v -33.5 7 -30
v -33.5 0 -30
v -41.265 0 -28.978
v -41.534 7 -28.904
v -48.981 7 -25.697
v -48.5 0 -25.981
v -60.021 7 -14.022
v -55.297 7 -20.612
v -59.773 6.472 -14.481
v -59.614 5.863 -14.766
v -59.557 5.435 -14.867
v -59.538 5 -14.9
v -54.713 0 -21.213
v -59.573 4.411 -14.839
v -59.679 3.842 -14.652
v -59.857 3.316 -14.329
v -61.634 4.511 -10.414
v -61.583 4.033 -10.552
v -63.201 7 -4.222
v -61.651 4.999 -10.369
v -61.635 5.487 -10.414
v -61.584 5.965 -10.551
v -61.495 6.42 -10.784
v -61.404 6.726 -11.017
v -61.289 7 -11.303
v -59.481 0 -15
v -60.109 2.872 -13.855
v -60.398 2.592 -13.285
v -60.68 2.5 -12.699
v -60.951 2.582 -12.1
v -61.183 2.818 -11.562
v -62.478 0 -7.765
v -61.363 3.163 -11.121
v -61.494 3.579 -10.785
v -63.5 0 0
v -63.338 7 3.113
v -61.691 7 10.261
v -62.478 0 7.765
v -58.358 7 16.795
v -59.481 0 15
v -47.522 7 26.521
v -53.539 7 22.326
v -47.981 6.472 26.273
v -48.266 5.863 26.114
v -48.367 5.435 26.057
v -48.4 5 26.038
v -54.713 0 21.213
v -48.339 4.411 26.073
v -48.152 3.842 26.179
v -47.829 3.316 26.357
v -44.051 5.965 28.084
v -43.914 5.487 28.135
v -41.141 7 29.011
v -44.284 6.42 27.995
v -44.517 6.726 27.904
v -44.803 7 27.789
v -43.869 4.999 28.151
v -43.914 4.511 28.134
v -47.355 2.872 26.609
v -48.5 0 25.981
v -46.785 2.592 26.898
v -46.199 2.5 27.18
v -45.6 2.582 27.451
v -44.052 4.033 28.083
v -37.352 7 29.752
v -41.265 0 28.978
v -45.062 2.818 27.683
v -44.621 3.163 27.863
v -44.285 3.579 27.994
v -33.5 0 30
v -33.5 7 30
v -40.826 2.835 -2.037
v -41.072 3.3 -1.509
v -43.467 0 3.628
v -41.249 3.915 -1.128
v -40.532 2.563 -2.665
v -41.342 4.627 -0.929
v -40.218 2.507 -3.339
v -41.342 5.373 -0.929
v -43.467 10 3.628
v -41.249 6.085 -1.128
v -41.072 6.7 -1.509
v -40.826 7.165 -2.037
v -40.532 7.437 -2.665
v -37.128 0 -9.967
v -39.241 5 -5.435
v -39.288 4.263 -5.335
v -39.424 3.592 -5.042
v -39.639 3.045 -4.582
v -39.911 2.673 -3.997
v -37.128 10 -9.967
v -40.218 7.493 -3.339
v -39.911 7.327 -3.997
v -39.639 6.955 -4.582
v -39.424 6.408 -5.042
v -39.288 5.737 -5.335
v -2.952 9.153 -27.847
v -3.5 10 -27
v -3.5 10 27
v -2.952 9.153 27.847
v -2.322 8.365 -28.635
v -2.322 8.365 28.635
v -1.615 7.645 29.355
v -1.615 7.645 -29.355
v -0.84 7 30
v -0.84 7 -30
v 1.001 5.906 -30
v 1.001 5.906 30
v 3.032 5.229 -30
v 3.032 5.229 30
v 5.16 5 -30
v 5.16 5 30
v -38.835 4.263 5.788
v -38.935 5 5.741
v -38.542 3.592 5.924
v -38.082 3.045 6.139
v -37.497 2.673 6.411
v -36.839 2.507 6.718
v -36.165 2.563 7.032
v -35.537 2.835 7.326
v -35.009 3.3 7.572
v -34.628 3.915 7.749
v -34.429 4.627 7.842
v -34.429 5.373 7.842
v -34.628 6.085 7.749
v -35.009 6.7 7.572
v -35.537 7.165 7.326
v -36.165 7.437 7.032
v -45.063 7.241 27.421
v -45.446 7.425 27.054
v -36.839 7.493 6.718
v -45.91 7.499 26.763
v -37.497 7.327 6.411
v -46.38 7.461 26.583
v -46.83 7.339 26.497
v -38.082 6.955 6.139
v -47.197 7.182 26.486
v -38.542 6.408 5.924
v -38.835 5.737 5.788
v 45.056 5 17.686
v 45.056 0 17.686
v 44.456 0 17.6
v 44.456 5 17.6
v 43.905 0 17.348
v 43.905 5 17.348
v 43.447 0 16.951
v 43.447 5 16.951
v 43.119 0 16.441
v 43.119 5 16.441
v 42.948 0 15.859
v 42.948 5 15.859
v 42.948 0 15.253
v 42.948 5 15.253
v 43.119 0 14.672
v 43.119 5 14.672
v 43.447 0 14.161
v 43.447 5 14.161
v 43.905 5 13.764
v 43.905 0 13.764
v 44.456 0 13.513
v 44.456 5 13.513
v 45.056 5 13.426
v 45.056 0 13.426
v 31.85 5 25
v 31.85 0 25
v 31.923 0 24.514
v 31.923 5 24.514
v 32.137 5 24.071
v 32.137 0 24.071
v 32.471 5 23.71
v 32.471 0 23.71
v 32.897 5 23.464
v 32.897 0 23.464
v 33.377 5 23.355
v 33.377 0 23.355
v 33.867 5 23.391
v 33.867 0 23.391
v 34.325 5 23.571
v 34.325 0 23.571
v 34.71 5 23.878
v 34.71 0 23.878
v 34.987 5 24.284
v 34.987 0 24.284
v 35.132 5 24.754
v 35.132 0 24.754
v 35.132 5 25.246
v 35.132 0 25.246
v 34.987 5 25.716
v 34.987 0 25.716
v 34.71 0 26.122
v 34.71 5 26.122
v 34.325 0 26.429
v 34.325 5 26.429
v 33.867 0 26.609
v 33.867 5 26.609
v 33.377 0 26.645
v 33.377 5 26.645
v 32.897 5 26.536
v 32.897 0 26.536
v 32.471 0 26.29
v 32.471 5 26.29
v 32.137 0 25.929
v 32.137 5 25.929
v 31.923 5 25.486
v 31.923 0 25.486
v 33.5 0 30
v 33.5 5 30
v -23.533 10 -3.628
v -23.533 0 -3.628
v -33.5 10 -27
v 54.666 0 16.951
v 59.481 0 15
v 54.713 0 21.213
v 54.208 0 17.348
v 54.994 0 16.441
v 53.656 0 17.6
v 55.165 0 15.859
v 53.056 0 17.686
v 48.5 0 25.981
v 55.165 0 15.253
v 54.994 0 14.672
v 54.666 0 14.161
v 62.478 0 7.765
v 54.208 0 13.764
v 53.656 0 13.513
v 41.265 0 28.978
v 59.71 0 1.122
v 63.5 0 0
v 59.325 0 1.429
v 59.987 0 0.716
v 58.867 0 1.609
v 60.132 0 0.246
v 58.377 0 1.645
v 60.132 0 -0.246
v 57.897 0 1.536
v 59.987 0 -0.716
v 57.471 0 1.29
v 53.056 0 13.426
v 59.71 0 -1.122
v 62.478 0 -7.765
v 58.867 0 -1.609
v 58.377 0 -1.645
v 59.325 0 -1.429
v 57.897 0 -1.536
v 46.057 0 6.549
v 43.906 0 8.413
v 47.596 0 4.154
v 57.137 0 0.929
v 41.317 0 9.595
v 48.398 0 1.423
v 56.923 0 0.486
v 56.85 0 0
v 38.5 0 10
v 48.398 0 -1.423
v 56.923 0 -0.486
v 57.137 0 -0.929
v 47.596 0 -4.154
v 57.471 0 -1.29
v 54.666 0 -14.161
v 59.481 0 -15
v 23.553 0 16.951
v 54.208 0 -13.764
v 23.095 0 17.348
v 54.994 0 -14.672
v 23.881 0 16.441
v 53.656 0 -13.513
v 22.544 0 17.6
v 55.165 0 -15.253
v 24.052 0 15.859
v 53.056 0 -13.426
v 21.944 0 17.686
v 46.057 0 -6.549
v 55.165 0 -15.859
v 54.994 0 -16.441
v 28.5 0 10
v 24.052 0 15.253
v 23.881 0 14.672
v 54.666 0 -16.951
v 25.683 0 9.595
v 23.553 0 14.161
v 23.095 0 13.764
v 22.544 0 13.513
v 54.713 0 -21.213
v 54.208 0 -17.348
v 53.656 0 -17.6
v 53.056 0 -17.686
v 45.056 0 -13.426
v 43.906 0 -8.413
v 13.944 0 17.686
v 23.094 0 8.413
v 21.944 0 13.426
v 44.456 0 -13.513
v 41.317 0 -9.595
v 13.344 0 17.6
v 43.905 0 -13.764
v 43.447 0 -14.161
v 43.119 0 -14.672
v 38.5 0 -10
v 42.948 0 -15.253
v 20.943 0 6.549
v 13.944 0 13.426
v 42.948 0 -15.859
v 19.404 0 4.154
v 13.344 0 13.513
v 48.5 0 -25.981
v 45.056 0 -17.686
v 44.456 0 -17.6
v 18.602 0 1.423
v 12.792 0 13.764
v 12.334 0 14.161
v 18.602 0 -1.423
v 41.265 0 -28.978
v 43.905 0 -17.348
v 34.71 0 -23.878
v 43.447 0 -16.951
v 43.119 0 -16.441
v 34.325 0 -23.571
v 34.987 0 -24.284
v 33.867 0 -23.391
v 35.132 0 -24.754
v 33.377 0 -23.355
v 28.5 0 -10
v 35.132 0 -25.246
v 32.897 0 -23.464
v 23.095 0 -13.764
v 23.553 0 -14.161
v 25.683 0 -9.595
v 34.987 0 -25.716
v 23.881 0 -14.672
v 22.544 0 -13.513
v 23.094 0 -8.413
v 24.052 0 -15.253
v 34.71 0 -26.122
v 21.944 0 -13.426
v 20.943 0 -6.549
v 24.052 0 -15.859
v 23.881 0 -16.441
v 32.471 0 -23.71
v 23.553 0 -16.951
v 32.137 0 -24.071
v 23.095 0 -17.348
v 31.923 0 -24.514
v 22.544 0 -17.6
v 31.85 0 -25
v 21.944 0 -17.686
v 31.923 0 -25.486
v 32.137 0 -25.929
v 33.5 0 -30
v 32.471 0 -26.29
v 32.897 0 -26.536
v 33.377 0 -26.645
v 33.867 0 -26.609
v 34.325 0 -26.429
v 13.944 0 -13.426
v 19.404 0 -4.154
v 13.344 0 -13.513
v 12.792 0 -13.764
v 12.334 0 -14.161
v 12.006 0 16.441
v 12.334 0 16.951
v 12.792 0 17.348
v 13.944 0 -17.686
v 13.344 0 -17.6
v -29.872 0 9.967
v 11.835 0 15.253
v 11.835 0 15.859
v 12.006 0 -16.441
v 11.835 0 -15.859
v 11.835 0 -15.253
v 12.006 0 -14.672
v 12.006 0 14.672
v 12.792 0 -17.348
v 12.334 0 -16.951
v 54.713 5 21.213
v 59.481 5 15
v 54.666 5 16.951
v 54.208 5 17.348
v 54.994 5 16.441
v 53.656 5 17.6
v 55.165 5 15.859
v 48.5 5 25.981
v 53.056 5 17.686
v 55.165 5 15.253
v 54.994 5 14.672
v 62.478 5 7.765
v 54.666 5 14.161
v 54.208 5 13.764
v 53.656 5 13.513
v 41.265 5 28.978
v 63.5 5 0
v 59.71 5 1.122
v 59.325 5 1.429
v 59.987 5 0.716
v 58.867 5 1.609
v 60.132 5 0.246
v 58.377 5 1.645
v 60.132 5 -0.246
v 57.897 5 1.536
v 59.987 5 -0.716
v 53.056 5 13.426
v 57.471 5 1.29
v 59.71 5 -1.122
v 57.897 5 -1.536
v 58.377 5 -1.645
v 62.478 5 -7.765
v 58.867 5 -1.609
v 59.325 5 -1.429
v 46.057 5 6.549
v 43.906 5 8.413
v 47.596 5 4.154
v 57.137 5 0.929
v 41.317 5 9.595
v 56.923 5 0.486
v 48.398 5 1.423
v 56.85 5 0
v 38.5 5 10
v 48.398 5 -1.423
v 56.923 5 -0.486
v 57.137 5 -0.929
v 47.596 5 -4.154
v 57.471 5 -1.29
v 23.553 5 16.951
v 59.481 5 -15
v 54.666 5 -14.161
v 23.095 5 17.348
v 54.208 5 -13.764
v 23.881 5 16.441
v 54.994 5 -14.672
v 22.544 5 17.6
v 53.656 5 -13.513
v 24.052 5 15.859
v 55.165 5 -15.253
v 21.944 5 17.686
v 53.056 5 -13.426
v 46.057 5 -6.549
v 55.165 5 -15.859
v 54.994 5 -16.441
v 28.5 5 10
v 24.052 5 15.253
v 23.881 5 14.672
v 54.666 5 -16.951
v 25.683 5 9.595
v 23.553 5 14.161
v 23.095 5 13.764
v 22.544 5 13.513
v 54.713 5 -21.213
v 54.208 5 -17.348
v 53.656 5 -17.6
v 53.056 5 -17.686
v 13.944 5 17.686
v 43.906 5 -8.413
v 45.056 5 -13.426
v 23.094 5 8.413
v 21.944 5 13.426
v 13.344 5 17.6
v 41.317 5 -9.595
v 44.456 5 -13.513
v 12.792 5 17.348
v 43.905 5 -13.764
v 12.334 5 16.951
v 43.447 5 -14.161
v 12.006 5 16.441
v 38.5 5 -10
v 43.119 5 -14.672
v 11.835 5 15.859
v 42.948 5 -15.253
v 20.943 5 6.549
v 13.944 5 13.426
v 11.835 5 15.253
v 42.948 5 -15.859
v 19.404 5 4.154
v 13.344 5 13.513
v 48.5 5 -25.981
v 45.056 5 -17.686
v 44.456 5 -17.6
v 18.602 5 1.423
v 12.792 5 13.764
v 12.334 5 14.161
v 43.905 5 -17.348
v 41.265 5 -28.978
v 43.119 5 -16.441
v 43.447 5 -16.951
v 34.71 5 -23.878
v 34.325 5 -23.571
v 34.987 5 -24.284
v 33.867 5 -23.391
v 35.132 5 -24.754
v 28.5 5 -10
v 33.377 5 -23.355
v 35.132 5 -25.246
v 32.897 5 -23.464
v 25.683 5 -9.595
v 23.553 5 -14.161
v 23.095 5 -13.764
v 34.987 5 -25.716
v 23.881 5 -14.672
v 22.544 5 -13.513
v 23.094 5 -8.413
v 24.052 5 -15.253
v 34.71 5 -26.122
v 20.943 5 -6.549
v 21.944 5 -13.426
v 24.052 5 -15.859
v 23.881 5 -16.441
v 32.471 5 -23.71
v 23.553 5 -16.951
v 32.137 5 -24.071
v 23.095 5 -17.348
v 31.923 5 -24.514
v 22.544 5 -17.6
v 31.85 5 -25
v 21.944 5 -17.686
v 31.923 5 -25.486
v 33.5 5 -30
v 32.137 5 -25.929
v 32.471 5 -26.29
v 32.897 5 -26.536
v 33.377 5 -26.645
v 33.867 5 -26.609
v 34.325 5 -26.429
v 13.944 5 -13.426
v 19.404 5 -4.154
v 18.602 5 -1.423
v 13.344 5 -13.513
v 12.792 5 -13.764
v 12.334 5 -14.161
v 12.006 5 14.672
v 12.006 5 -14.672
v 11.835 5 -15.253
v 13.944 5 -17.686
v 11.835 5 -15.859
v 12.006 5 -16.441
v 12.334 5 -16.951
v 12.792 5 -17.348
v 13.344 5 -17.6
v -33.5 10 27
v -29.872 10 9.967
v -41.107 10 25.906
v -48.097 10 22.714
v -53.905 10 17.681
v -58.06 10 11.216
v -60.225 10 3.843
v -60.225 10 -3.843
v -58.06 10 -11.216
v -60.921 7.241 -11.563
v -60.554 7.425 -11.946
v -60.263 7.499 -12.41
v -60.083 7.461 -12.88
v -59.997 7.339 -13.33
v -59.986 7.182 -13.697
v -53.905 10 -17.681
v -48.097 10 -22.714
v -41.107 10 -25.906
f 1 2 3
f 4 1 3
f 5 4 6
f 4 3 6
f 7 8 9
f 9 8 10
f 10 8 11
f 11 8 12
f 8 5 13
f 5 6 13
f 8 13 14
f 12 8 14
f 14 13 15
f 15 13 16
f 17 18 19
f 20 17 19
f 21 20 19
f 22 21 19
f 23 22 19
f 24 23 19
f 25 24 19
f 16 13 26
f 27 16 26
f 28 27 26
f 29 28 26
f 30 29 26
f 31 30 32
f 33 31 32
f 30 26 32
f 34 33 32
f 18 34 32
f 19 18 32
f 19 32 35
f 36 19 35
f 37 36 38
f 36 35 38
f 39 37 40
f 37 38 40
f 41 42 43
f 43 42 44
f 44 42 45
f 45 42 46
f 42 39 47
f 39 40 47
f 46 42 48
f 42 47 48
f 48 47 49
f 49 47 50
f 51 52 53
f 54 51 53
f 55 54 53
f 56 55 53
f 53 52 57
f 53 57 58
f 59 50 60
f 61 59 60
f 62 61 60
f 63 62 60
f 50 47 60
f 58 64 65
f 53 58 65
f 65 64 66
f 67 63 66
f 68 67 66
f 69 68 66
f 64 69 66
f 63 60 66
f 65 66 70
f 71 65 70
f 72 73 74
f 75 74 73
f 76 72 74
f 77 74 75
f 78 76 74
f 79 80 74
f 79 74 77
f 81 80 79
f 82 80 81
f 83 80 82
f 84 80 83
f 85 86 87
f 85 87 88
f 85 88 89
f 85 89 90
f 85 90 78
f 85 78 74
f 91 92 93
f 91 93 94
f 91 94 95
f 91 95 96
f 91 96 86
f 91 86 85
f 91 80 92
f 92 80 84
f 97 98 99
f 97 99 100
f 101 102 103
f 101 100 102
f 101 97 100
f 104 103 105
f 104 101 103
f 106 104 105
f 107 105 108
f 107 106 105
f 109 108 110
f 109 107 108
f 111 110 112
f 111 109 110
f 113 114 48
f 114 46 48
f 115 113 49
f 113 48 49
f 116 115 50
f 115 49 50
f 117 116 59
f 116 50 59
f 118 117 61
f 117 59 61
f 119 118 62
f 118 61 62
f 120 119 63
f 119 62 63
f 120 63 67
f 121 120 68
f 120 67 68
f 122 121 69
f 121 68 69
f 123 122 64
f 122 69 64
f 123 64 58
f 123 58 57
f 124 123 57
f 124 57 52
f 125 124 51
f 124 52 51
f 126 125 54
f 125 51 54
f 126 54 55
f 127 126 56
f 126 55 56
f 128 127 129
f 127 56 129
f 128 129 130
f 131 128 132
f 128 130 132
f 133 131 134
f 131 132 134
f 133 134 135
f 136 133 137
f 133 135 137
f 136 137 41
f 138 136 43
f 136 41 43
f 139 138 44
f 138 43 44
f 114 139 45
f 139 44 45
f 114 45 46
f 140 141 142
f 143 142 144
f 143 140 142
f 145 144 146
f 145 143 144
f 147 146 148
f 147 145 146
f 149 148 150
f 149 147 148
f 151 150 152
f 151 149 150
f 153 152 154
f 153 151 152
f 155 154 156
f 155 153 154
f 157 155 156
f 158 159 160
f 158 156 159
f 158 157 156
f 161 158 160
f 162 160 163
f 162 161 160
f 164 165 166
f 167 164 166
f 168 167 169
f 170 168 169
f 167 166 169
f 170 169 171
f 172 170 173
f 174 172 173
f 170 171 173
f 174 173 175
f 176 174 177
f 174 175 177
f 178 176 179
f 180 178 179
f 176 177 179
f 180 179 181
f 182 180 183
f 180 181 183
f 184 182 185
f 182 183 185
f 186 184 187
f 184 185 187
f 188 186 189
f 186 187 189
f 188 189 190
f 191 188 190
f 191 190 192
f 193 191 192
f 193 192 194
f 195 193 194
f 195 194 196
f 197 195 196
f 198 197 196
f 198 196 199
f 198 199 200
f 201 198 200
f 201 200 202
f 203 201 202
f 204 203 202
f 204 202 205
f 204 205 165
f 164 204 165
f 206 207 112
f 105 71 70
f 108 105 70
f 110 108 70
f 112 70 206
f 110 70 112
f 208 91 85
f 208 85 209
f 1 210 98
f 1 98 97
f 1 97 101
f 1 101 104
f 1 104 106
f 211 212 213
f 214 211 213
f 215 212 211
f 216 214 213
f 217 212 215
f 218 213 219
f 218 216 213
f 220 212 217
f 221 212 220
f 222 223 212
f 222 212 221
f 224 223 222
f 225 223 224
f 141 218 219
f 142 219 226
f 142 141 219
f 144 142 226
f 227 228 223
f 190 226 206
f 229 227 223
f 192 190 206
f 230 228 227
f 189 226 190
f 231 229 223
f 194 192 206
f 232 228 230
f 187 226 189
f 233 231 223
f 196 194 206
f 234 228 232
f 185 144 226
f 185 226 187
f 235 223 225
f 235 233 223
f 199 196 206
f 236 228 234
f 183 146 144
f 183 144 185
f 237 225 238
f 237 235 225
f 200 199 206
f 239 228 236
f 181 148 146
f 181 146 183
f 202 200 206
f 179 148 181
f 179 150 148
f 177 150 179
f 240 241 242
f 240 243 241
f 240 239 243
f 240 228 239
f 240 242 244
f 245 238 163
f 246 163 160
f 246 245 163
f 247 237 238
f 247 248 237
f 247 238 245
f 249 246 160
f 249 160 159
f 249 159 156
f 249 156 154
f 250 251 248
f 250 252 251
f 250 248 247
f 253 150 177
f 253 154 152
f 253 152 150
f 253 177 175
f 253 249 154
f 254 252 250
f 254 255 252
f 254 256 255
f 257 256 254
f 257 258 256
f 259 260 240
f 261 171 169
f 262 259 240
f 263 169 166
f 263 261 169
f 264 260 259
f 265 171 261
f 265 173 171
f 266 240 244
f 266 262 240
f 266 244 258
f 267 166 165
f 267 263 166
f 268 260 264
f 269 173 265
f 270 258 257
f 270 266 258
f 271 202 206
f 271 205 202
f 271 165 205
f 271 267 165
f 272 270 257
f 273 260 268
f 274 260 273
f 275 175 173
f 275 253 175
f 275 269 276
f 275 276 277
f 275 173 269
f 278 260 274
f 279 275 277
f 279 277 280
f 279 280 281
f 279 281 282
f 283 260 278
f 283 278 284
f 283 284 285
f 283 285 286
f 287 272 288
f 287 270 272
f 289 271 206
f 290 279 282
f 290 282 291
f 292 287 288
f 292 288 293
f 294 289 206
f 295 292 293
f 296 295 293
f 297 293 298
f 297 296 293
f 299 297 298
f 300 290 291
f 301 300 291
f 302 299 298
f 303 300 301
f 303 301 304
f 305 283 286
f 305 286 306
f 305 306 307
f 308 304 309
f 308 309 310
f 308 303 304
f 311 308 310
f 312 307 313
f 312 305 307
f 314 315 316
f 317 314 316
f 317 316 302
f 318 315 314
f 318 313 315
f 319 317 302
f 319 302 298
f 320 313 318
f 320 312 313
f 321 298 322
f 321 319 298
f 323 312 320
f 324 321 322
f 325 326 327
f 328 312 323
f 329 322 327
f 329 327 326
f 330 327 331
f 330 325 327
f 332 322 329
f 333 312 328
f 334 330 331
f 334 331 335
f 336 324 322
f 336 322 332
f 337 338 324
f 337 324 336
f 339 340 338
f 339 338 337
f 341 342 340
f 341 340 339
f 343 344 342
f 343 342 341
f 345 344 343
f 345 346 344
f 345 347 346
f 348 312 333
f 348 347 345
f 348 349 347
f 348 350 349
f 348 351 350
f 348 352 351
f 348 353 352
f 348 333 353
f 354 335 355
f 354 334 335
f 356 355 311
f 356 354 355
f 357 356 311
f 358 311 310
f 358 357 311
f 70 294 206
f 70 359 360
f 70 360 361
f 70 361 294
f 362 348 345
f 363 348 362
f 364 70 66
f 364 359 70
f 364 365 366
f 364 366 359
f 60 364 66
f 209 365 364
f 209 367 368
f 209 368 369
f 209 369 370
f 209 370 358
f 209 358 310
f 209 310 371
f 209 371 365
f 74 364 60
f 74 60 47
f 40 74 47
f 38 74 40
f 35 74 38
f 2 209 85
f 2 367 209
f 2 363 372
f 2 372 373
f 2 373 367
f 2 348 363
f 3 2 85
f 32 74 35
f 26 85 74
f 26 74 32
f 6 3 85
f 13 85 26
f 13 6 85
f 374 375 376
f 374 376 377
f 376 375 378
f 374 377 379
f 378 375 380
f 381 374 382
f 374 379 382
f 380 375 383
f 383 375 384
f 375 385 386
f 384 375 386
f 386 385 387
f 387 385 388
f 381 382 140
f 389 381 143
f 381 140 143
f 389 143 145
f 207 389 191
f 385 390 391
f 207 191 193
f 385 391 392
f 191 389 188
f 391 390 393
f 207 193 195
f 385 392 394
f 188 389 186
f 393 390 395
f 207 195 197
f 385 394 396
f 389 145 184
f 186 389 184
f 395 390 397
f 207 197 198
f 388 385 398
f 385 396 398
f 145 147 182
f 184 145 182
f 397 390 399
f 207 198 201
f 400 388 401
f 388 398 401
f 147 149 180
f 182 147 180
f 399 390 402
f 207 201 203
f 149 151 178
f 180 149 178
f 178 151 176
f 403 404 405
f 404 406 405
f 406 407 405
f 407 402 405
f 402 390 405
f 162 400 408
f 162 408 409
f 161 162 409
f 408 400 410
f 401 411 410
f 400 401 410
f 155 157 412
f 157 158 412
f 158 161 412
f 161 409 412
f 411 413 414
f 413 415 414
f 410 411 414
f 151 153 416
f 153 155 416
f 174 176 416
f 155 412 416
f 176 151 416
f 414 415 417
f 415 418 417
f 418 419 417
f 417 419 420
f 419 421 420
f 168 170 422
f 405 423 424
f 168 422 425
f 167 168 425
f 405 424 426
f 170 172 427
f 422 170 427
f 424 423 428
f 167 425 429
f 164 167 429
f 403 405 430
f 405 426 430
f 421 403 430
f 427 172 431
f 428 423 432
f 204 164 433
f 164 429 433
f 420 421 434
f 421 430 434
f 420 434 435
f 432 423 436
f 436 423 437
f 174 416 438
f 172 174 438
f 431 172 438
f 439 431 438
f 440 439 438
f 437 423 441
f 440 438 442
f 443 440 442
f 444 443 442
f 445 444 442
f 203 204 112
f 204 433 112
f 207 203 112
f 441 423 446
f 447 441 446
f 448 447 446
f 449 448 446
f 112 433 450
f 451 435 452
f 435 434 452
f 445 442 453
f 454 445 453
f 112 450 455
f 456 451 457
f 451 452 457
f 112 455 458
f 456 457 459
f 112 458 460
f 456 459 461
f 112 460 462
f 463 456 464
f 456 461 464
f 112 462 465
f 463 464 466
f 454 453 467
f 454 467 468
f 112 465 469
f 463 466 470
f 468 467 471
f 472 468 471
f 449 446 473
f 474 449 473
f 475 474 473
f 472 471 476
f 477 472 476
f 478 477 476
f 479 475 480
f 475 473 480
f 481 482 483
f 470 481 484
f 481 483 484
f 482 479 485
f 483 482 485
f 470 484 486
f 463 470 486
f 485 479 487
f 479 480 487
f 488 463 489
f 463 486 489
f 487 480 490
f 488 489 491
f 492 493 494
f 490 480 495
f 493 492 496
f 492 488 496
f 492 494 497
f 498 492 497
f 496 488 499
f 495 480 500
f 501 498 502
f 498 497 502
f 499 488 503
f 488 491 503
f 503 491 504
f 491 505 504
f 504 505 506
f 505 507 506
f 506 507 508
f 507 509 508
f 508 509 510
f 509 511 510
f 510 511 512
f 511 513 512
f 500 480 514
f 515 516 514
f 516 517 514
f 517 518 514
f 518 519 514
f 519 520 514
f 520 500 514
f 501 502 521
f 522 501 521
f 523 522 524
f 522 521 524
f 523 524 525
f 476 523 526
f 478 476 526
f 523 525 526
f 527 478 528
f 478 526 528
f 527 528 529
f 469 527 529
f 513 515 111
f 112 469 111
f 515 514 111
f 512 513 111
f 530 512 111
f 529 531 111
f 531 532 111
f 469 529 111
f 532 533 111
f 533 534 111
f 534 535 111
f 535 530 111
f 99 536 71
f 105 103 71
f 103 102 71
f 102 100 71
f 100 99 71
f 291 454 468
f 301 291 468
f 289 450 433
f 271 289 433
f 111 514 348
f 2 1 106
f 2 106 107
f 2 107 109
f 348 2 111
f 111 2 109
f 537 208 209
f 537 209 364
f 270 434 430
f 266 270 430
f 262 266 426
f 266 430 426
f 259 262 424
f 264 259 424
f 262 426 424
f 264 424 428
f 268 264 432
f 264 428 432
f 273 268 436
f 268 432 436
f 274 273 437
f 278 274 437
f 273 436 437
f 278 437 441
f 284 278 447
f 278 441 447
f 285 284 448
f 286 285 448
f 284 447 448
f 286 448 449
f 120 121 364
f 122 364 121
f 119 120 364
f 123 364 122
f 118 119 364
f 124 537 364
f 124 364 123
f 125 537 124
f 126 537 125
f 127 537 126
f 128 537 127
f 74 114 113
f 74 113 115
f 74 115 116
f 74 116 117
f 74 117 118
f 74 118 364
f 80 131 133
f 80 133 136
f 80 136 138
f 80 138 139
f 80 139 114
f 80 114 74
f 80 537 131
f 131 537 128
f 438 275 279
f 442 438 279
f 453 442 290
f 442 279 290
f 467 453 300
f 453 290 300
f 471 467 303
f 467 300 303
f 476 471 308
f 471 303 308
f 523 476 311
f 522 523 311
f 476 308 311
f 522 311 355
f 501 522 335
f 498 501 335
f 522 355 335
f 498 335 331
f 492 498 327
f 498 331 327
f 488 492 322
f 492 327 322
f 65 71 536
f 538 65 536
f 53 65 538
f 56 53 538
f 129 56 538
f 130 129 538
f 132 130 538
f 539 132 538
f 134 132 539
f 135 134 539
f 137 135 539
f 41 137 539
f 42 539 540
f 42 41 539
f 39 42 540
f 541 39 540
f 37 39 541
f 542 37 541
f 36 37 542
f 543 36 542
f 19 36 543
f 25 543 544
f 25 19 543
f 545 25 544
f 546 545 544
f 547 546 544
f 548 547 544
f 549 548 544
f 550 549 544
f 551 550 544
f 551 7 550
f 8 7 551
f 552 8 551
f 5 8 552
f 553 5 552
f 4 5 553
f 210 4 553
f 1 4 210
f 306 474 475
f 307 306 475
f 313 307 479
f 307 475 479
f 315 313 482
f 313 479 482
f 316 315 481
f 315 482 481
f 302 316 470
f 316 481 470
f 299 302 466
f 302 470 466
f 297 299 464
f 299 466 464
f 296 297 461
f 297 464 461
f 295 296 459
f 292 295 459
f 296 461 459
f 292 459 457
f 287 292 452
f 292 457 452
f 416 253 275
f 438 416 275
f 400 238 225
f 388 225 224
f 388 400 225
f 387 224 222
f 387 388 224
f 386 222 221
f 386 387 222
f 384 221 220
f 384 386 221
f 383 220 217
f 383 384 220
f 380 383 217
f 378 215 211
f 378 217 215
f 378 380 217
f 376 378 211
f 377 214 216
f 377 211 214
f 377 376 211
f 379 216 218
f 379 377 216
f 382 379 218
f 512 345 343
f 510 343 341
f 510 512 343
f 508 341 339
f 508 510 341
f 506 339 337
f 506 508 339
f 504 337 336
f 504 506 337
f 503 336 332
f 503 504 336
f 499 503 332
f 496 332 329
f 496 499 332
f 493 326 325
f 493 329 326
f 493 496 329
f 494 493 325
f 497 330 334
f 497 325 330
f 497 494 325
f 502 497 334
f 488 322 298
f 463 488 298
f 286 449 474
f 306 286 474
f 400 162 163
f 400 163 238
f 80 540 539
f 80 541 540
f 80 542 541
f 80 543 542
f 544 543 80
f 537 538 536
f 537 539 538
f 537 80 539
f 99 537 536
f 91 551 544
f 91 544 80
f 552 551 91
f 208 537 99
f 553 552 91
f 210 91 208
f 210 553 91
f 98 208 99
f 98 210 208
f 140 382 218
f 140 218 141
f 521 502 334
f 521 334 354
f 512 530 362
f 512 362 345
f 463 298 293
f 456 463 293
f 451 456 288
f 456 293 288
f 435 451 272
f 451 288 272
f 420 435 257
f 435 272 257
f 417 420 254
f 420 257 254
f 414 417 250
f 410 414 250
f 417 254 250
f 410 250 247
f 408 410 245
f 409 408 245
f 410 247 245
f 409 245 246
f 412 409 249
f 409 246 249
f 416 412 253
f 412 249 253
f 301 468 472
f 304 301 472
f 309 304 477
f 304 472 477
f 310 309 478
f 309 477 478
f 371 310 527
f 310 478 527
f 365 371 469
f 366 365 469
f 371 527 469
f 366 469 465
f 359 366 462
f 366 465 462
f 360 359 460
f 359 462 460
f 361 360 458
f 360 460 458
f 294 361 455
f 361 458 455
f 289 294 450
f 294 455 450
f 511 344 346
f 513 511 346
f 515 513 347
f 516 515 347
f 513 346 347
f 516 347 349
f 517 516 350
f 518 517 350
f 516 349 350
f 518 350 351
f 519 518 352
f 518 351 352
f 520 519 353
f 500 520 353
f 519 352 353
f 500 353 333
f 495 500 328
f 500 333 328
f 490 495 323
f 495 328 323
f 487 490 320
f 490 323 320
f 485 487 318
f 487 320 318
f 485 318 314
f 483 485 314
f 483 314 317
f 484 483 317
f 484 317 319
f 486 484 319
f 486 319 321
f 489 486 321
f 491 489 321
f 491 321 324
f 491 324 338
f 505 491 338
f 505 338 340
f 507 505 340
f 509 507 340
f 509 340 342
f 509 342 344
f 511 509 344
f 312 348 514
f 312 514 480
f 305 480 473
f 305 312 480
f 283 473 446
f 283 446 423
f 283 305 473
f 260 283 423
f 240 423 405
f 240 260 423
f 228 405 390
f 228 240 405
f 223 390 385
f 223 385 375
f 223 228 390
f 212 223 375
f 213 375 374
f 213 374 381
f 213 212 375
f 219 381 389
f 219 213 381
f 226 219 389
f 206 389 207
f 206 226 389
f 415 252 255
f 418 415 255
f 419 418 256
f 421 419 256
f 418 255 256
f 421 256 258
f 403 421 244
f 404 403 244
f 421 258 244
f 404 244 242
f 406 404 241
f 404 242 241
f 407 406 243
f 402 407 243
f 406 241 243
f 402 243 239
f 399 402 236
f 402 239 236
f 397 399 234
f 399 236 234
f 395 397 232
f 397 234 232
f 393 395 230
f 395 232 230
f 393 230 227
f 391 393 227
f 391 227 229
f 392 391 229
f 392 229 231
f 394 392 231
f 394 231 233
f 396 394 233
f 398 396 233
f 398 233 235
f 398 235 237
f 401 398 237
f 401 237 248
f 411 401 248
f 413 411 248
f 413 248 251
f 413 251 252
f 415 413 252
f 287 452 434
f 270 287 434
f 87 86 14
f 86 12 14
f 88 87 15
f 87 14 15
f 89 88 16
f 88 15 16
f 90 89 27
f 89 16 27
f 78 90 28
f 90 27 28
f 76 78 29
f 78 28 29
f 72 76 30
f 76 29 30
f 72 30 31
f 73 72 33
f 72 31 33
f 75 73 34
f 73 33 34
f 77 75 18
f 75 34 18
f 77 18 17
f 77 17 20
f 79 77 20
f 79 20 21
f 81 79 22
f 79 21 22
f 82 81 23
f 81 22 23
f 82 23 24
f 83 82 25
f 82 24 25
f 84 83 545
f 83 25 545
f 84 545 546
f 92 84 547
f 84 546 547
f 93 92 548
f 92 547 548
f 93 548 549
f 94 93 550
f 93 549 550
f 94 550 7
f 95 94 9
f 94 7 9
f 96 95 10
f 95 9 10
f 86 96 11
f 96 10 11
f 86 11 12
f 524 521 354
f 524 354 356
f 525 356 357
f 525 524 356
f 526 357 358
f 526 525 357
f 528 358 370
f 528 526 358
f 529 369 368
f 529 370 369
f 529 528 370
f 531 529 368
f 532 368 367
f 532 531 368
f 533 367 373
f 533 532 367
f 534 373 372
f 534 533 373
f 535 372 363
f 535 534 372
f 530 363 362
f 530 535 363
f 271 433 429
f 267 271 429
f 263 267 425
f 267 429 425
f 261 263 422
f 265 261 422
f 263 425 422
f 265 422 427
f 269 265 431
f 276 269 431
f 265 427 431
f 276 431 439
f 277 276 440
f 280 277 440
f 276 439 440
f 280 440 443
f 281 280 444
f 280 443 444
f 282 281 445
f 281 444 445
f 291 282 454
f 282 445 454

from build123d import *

# Parameters (mm, degrees)
BOSS_EXTRUDE1_DEPTH = 5
CUT_EXTRUDE1_DEPTH  = 71.407741052
BOSS_EXTRUDE2_DEPTH = 5
FILLET1_R           = 10
CUT_EXTRUDE2_DEPTH  = 71.938353519
M4_TAPPED_HOLE1_D   = 3.3
SKETCH13_W          = 2.5
SKETCH13_H          = 32.367781463
SKETCH14_W          = 2.5
SKETCH14_H          = 32.367781463
CHAMFER1_SIZE       = 3


with BuildPart() as part:
    # Sketch1 → Boss-Extrude1 (new body)
    with BuildSketch(Plane(origin=(0, 0, 0), x_dir=(1, 0, 0), z_dir=(0, 1, 0))):
        with BuildLine():
            Line((-33.5, 30), (33.5, 30))
            ThreePointArc((33.5, 30), (63.5, 0), (33.5, -30))
            Line((33.5, -30), (-33.5, -30))
            ThreePointArc((-33.5, -30), (-63.5, 0), (-33.5, 30))
        make_face()
        with BuildLine():
            Line((28.5, 10), (38.5, 10))
            ThreePointArc((38.5, 10), (48.5, 0), (38.5, -10))
            Line((38.5, -10), (28.5, -10))
            ThreePointArc((28.5, -10), (18.5, 0), (28.5, 10))
        make_face(mode=Mode.SUBTRACT)
    extrude(amount=BOSS_EXTRUDE1_DEPTH)

    # Sketch2 → Cut-Extrude1 (cut, through all)
    with BuildSketch(Plane(origin=(0, 5, 0), x_dir=(1, 0, 0), z_dir=(0, 1, 0))):
        with BuildLine():
            Line((13.943650814, 17.686349186), (21.943650814, 17.686349186))
            ThreePointArc((21.943650814, 17.686349186), (24.073650814, 15.556349186), (21.943650814, 13.426349186))
            Line((21.943650814, 13.426349186), (13.943650814, 13.426349186))
            ThreePointArc((13.943650814, 13.426349186), (11.813650814, 15.556349186), (13.943650814, 17.686349186))
        make_face()
        with BuildLine():
            Line((53.056349186, 17.686349186), (45.056349186, 17.686349186))
            ThreePointArc((45.056349186, 17.686349186), (42.926349186, 15.556349186), (45.056349186, 13.426349186))
            Line((45.056349186, 13.426349186), (53.056349186, 13.426349186))
            ThreePointArc((53.056349186, 13.426349186), (55.186349186, 15.556349186), (53.056349186, 17.686349186))
        make_face()
        with BuildLine():
            Line((53.056349186, -17.686349186), (45.056349186, -17.686349186))
            ThreePointArc((45.056349186, -17.686349186), (42.926349186, -15.556349186), (45.056349186, -13.426349186))
            Line((45.056349186, -13.426349186), (53.056349186, -13.426349186))
            ThreePointArc((53.056349186, -13.426349186), (55.186349186, -15.556349186), (53.056349186, -17.686349186))
        make_face()
        with BuildLine():
            Line((13.943650814, -17.686349186), (21.943650814, -17.686349186))
            ThreePointArc((21.943650814, -17.686349186), (24.073650814, -15.556349186), (21.943650814, -13.426349186))
            Line((21.943650814, -13.426349186), (13.943650814, -13.426349186))
            ThreePointArc((13.943650814, -13.426349186), (11.813650814, -15.556349186), (13.943650814, -17.686349186))
        make_face()
    extrude(amount=-CUT_EXTRUDE1_DEPTH, mode=Mode.SUBTRACT)

    # Sketch8 → Boss-Extrude2 (add)
    with BuildSketch(Plane(origin=(0, 5, 0), x_dir=(1, 0, 0), z_dir=(0, 1, 0))):
        with BuildLine():
            ThreePointArc((-33.5, -30), (-12.286796564, -21.213203436), (-3.5, 0))
            ThreePointArc((-3.5, 0), (-12.286796564, 21.213203436), (-33.5, 30))
            ThreePointArc((-33.5, 30), (-63.5, 0), (-33.5, -30))
        make_face()
        with BuildLine():
            Line((-3.5, 0), (-3.5, 30))
            Line((-3.5, 30), (-33.5, 30))
            ThreePointArc((-33.5, 30), (-12.286796564, 21.213203436), (-3.5, 0))
        make_face()
        with BuildLine():
            Line((-3.5, -30), (-3.5, 0))
            ThreePointArc((-3.5, 0), (-12.286796564, -21.213203436), (-33.5, -30))
            Line((-33.5, -30), (-3.5, -30))
        make_face()
    extrude(amount=BOSS_EXTRUDE2_DEPTH)

    # Fillet1
    # the kernel refuses this fillet: 10 mm, written as the material it adds along each edge
    with BuildSketch(Plane(origin=(-3.5, 5, -30), x_dir=(0, 1, 0), z_dir=(0, 0, 1))) as fillet1_piece_1:
        with BuildLine():
            CenterArc((10, -8.660254038), FILLET1_R, 120, 60)
            Line((0, -8.660254038), (-0.2, -8.660254038))
            Line((-0.2, -8.660254038), (-0.2, 0))
            Line((-0.2, 0), (0, 0.2))
            ThreePointArc((0, 0.2), (2.5, 0.2), (4.9, 0.173205081))
            Line((4.9, 0.173205081), (5, 0))
        make_face()
    extrude(amount=60)

    # Sketch9 → Cut-Extrude2 (cut, through all)
    with BuildSketch(Plane(origin=(0, 10, 0), x_dir=(1, 0, 0), z_dir=(0, 1, 0))):
        Polygon((-43.466945366, -3.62767144), (-37.12767144, 9.966945366), (-23.533054634, 3.62767144), (-29.87232856, -9.966945366), align=None)
    extrude(amount=-CUT_EXTRUDE2_DEPTH, mode=Mode.SUBTRACT)

    # M4 Tapped Hole1 (through all)
    with Locations(Plane(origin=(0, 5, 0), x_dir=(1, 0, 0), z_dir=(0, 1, 0))):
        with Locations((33.5, 25), (33.5, -25), (58.5, 0)):
            Hole(M4_TAPPED_HOLE1_D / 2)

    # Sketch13 → M6 Tapped Hole1 (revolve, cut)
    with BuildSketch(Plane(origin=(-40.297308403, 5, -3.169636963), x_dir=(0.4226182617407039, 0, -0.9063077870366479), z_dir=(0, 1, 0))):
        with Locations((1.25, 16.183890732)):
            Rectangle(SKETCH13_W, SKETCH13_H)
    revolve(axis=Axis((-34.542253955, 5, -0.486011001), (-0.9063077870366478, 0, -0.4226182617407039)), mode=Mode.SUBTRACT)

    # Sketch14 → M6 Tapped Hole2 (revolve, cut)
    with BuildSketch(Plane(origin=(-36.669636963, 5, 6.797308403), x_dir=(-0.9063077870366478, 0, -0.42261826174070416), z_dir=(0, 1, 0))):
        with Locations((1.25, 16.183890732)):
            Rectangle(SKETCH14_W, SKETCH14_H)
    revolve(axis=Axis((-33.986011001, 5, 1.042253955), (-0.4226182617407042, 0, 0.9063077870366477)), mode=Mode.SUBTRACT)

    # Chamfer1
    # the kernel refuses this chamfer: 3 mm, written as the material it takes off along each edge
    with BuildSketch(Plane(origin=(-33.5, 10, 30), x_dir=(0, 0.02749587661058619, -0.9996219169112968), z_dir=(1, 0, 0)), Plane(origin=(4.215048964, 10, -30), x_dir=(0, 0.02749587661058619, 0.9996219169112968), z_dir=(-1, 0, 0))) as chamfer1_piece_1:
        Polygon((CHAMFER1_SIZE * 0.999621916911, -CHAMFER1_SIZE * 0.0274958766106), (-CHAMFER1_SIZE * 0.0274958766106, -CHAMFER1_SIZE * 0.999621916911), (0, 0), align=None)
    extrude(amount=37.715048964, mode=Mode.SUBTRACT)
    with BuildSketch(Plane(origin=(-33.5, 10, 0), x_dir=(0, 0, 1), z_dir=(1, 0, 0))) as chamfer1_piece_2:
        Polygon((30 - CHAMFER1_SIZE, 0), (30, CHAMFER1_SIZE), (30, 0), align=None)
    revolve(axis=Axis((-33.5, 10, 0), (0, -1, 0)), revolution_arc=180, mode=Mode.SUBTRACT)


solid = part.part
